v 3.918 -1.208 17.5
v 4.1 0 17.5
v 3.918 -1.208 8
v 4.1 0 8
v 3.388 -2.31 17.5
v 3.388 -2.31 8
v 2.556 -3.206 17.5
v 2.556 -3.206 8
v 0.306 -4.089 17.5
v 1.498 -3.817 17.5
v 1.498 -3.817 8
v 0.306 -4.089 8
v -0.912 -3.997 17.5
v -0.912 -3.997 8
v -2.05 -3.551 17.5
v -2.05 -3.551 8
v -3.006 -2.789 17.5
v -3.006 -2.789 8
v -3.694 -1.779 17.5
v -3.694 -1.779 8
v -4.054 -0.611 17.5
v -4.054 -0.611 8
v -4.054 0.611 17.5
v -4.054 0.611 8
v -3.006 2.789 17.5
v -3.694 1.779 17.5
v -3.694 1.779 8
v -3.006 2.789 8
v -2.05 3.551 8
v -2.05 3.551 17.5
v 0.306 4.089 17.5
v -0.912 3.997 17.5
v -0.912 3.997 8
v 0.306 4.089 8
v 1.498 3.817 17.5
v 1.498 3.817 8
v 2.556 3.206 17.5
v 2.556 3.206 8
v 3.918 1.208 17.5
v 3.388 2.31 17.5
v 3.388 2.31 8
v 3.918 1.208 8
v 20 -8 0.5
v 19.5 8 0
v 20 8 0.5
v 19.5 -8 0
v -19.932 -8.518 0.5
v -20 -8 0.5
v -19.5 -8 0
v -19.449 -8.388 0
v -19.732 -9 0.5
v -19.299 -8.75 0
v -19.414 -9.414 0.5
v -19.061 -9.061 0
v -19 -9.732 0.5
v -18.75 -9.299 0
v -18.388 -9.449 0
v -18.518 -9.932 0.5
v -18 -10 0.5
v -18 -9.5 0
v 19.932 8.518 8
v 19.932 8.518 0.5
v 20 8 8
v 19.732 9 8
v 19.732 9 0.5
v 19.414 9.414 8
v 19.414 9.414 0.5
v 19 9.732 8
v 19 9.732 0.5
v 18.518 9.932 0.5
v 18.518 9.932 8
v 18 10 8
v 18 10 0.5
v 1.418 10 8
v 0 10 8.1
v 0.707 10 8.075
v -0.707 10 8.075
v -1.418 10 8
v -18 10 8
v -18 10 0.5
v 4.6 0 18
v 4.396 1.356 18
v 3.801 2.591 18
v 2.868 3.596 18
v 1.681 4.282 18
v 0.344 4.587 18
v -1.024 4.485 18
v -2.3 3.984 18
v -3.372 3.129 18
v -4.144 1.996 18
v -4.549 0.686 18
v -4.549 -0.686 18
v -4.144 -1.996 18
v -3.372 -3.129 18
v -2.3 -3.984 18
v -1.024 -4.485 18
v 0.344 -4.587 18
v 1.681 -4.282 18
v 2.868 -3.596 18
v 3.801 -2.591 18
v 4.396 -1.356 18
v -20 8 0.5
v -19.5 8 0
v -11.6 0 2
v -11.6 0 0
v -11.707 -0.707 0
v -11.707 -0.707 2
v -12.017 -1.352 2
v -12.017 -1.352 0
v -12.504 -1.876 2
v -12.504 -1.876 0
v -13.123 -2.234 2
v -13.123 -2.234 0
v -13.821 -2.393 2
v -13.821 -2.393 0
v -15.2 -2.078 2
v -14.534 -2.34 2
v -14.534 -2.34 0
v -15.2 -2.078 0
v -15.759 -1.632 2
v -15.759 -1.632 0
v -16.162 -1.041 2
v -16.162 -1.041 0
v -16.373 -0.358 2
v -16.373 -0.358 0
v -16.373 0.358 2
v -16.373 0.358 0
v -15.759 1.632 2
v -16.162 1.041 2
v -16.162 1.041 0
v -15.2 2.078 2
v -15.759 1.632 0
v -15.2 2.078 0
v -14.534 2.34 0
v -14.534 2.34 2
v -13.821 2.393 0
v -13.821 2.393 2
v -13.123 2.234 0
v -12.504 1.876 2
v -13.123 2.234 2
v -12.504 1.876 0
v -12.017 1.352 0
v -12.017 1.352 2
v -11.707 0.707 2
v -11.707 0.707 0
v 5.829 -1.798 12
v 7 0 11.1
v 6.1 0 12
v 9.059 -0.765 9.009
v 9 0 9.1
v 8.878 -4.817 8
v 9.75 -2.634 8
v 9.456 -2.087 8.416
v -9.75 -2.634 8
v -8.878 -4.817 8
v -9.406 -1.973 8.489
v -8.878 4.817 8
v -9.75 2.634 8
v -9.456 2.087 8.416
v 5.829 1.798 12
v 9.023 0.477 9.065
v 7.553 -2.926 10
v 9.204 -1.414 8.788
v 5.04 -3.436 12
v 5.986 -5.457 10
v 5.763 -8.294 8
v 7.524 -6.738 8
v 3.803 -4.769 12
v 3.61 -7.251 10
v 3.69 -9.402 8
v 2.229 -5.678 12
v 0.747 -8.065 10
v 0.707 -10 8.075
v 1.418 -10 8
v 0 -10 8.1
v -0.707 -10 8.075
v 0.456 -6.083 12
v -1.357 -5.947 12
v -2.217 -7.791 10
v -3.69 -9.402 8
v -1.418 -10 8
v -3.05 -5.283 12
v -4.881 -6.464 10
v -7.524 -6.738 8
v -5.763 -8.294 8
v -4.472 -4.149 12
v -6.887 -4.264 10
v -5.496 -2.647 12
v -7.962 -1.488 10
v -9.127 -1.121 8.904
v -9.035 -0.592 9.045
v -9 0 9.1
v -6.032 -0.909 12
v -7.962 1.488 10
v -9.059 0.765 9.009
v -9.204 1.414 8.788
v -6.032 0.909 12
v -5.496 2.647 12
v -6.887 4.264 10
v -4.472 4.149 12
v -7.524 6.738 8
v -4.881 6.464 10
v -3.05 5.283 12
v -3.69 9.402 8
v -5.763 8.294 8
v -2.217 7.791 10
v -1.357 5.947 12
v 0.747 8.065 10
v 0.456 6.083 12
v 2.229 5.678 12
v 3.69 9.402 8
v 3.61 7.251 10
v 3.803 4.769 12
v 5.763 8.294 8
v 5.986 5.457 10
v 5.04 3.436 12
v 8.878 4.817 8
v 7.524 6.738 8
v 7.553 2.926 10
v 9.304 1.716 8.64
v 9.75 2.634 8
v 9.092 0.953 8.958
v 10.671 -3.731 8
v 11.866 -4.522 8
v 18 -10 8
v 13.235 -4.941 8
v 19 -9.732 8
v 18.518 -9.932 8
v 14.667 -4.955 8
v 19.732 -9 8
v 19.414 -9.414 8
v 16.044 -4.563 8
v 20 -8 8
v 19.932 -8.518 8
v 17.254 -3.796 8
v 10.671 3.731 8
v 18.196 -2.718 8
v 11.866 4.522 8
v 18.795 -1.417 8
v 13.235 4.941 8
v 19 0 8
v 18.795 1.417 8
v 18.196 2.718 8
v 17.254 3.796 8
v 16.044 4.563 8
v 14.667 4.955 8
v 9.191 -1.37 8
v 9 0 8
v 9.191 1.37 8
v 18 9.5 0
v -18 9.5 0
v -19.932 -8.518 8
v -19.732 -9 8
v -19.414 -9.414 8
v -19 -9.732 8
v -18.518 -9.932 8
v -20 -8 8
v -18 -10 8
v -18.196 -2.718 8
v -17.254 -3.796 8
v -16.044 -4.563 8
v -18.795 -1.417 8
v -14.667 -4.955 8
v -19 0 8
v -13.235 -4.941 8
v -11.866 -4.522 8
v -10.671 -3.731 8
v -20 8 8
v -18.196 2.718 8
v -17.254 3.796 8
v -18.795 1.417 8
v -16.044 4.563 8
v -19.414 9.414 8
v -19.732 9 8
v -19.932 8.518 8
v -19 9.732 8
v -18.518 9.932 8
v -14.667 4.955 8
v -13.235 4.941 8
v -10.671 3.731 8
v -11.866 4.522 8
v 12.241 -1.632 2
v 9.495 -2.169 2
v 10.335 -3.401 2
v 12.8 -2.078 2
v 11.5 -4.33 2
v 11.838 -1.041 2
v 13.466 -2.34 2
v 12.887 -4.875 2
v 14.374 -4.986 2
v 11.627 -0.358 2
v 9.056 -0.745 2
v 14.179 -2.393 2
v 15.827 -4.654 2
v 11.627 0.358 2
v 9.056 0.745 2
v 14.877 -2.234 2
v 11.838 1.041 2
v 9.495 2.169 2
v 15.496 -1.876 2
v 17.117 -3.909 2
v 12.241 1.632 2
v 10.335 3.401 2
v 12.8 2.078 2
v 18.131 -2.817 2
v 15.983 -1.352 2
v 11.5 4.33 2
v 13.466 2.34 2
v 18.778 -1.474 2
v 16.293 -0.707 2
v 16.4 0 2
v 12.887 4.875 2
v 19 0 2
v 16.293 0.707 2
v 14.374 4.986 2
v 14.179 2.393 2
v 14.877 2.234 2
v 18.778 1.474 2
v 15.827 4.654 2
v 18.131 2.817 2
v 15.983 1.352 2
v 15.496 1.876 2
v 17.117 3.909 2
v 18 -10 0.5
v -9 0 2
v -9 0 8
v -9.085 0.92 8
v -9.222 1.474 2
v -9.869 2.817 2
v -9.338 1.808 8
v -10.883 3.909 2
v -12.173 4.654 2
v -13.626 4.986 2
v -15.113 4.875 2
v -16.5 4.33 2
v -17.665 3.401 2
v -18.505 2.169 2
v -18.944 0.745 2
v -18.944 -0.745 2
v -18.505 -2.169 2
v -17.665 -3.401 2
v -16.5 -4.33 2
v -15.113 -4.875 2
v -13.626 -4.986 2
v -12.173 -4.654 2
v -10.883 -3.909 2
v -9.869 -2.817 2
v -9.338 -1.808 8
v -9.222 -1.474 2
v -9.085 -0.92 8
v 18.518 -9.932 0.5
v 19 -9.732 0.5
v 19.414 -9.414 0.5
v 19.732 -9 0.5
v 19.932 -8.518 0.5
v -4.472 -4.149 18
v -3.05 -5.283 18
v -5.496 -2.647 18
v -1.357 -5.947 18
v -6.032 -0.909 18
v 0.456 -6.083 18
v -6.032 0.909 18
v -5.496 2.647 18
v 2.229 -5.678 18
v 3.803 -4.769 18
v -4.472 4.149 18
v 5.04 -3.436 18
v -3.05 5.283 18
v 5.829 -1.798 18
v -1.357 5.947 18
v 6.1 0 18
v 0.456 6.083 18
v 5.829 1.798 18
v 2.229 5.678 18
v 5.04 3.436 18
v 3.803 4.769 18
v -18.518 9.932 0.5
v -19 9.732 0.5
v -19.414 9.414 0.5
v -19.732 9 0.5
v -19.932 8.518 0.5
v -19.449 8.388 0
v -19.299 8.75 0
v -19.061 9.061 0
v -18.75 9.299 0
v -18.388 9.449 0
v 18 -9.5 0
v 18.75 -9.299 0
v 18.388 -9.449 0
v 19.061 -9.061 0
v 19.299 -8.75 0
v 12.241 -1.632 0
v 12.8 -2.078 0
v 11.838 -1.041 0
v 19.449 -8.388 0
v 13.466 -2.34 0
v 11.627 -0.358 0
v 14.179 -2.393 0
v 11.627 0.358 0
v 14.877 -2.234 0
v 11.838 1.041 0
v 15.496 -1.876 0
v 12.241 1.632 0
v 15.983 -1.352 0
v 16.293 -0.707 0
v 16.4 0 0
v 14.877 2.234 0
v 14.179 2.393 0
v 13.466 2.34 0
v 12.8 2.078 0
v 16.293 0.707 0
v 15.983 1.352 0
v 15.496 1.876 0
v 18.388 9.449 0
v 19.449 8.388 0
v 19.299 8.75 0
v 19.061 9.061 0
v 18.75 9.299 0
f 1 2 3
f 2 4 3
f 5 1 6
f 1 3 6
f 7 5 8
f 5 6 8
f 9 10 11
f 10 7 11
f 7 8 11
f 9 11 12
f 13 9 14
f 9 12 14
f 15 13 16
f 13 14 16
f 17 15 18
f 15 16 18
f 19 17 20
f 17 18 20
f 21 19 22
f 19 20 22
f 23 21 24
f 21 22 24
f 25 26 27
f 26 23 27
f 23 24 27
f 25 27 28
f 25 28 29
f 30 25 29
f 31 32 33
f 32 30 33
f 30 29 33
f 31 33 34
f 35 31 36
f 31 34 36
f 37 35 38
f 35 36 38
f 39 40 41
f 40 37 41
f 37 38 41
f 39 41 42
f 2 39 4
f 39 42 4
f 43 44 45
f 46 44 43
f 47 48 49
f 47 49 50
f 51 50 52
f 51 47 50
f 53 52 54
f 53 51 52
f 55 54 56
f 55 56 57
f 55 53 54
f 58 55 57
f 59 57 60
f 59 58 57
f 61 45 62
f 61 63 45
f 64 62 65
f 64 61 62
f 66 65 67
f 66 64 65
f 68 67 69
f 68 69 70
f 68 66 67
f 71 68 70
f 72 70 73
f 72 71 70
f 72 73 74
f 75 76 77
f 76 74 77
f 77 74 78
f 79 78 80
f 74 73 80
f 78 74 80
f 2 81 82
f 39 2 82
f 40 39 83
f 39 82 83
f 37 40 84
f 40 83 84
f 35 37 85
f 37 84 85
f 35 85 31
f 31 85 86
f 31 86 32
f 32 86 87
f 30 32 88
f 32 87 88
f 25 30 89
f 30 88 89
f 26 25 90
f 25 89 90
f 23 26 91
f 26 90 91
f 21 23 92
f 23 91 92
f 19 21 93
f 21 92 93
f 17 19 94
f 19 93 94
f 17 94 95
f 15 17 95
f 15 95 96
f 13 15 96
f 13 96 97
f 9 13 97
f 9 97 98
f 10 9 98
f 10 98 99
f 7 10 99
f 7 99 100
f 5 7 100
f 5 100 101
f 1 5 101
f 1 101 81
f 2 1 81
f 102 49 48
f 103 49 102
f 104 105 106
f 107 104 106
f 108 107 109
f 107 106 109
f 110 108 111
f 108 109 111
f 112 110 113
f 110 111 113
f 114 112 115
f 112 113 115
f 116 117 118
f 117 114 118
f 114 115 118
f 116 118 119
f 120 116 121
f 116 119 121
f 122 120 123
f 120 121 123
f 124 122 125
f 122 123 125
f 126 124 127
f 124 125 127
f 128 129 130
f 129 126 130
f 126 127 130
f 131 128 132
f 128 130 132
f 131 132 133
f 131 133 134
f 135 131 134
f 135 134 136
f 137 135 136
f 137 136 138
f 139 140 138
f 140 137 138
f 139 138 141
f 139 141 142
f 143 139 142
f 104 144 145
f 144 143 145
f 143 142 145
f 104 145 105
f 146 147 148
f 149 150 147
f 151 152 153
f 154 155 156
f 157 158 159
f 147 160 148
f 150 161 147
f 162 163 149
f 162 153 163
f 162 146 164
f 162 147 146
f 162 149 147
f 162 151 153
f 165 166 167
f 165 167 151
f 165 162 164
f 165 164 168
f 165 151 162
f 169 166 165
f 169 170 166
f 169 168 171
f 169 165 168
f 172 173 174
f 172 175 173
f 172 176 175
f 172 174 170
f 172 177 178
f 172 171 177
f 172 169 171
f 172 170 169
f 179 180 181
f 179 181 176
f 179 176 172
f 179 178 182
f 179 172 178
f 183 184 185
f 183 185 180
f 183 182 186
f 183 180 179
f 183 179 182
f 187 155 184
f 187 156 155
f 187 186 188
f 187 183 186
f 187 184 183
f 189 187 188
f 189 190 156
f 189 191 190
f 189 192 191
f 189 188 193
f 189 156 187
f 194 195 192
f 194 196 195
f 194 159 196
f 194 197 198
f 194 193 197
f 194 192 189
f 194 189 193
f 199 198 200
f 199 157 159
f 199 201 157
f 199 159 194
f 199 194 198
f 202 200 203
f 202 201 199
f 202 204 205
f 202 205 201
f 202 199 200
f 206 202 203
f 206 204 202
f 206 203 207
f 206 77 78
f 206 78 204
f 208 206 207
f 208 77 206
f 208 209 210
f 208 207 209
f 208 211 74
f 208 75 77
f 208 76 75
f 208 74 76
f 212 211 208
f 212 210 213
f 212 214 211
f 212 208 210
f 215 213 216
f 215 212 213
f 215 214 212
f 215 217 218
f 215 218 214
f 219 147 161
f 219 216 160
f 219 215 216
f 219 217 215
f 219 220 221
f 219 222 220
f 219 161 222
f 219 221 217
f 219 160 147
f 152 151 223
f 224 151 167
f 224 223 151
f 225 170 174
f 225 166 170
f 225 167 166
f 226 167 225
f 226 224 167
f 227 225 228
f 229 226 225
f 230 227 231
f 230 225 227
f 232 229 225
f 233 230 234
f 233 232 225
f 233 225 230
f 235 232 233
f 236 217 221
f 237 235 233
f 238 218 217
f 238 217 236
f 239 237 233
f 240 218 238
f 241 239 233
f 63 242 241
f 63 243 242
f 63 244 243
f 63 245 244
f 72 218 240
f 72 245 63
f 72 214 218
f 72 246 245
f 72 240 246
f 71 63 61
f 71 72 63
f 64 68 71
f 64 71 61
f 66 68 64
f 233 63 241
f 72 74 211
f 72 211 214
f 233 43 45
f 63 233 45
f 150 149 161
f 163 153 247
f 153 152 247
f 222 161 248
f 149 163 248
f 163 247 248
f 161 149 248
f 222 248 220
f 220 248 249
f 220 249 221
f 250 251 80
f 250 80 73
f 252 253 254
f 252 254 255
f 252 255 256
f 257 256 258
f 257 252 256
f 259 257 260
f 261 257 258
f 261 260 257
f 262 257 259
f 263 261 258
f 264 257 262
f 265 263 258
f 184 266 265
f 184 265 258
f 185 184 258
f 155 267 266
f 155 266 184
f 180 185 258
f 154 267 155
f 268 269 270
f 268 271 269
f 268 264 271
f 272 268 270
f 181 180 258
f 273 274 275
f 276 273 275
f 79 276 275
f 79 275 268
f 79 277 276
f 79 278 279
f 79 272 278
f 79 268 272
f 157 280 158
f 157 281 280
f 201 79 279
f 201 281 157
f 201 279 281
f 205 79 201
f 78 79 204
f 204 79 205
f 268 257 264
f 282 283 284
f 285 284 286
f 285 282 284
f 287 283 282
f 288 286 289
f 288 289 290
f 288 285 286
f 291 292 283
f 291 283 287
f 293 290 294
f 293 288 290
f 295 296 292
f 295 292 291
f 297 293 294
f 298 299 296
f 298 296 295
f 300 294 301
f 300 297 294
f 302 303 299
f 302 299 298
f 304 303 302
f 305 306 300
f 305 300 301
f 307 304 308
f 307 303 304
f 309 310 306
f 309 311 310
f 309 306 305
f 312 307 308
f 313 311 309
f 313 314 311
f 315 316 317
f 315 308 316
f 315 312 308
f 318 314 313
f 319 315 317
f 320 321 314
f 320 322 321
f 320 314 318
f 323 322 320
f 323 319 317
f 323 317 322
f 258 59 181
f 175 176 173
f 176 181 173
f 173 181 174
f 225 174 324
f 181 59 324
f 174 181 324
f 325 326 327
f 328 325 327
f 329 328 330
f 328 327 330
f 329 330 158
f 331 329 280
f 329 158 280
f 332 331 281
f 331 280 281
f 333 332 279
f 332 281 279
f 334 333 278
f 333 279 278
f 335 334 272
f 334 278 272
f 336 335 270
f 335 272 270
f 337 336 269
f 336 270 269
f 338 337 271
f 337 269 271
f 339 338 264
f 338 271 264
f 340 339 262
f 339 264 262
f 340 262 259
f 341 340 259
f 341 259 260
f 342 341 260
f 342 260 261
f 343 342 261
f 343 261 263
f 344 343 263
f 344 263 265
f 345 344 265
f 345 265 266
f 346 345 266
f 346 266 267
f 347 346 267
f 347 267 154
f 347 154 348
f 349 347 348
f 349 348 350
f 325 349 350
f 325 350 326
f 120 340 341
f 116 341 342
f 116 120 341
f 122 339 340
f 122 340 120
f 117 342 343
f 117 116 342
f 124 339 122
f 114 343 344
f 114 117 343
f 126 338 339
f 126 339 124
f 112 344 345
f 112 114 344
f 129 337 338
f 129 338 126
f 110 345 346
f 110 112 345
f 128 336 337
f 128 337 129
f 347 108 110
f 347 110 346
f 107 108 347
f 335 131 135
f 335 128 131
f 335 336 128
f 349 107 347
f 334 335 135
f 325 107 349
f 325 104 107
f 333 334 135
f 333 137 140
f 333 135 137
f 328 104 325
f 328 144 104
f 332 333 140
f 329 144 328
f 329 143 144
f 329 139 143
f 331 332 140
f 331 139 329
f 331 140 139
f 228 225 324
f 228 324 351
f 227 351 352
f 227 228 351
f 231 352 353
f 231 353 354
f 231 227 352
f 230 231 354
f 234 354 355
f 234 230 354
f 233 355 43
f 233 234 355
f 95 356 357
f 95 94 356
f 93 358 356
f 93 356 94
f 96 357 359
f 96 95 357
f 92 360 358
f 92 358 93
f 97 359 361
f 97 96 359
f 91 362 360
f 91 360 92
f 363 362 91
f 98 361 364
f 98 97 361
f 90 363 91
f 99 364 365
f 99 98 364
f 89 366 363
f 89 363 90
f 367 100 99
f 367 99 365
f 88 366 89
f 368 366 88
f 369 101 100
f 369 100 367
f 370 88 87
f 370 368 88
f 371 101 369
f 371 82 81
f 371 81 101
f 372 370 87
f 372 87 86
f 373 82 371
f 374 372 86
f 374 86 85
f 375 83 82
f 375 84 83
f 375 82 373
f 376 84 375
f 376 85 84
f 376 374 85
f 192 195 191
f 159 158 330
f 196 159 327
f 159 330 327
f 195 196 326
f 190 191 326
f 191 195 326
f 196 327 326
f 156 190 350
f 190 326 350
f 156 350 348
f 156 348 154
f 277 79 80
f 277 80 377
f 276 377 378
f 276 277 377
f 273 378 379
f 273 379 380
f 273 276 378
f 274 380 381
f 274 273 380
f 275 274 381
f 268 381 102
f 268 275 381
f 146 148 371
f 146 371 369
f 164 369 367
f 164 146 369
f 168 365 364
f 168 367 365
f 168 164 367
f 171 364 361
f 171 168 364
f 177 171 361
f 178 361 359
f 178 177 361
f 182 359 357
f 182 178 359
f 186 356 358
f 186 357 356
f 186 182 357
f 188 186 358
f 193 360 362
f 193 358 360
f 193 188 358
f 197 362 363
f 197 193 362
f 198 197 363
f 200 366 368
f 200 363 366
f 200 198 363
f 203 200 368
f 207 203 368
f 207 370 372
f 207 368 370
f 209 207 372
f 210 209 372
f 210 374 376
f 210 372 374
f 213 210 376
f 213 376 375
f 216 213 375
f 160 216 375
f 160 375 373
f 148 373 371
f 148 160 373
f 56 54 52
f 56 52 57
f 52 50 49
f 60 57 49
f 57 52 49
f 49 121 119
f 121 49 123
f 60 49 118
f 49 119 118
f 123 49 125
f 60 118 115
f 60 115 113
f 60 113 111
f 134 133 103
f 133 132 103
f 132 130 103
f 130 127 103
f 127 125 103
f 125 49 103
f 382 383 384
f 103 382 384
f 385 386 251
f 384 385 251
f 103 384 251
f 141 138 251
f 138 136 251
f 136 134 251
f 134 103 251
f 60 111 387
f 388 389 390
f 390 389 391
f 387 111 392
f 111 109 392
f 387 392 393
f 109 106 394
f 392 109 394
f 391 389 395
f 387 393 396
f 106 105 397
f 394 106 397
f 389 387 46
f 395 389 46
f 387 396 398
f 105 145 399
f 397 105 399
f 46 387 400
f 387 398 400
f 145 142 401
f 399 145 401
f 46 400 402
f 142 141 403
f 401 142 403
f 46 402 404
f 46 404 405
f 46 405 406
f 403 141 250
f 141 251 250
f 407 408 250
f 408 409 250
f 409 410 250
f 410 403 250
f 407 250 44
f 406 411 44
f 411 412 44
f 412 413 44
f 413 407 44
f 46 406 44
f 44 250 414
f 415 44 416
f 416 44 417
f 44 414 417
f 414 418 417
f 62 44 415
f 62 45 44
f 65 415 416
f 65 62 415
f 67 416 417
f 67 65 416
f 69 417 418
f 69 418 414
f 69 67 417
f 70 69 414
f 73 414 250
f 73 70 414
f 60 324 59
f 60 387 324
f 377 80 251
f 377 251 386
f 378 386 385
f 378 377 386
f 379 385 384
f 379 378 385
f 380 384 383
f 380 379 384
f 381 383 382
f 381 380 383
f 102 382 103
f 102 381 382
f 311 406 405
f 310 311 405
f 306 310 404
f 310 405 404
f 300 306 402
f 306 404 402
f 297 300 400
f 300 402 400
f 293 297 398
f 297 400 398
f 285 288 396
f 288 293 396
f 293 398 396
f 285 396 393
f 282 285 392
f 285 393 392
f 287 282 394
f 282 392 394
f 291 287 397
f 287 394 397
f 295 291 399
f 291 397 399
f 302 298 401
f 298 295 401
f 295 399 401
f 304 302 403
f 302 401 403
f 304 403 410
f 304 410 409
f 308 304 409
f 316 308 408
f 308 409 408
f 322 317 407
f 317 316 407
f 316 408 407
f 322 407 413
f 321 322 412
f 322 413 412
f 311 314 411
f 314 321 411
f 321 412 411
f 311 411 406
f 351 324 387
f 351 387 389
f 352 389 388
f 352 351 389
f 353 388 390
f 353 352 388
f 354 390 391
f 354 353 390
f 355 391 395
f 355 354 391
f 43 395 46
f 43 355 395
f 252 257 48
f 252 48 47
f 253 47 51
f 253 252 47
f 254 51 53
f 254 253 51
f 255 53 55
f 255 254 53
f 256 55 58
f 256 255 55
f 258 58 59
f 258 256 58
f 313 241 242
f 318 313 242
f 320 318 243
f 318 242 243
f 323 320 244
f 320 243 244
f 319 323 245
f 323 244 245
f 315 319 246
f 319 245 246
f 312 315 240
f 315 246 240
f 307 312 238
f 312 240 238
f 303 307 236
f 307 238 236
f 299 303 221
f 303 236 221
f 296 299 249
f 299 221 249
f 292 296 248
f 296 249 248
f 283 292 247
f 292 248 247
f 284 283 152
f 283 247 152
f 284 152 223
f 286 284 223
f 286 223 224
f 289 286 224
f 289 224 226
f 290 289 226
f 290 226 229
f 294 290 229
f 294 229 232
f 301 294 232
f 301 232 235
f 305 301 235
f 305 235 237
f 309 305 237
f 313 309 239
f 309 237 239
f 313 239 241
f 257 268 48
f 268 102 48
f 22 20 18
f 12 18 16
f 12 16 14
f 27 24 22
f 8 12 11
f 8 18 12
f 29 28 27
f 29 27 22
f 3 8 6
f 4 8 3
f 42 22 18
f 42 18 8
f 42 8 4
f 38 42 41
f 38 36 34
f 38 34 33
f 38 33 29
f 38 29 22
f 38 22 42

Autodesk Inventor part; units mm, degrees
ref_plane "YZ Plane" through (0, 0, 0) normal (1, 0, 0) x (0, 1, 0)
ref_plane "XZ Plane" through (0, 0, 0) normal (0, 1, 0) x (-1, 0, 0)
ref_plane "XY Plane" through (0, 0, 0) normal (0, 0, 1) x (1, 0, 0)
sketch "Sketch1" plane through (0, 0, 0) normal (0, 0, 1) x (1, 0, 0)
  line L0 (-20, -10) -> (20, -10)
  line L1 (20, -10) -> (20, 10)
  line L2 (20, 10) -> (-20, 10)
  line L3 (-20, 10) -> (-20, -10)
  line L4 (-20, -10) -> (20, 10) construction
  line L5 (20, -10) -> (-20, 10) construction
  line L6 (-28, 0) -> (28, 0) projected
  circle A0 centre (-14, 0) radius 2.4
  circle A1 centre (14, 0) radius 2.4
  point P0 (0, 0)
  dimension "d0" = 40
  dimension "d1" = 20
  dimension "d2" = 4.8
  dimension "d3" = 4.8
  dimension "d4" = 6
  dimension "d5" = 6
extrude "Extrusion1" add sketch "Sketch1" along normal blind 8 contours L3 L6 A0 A1 L1 L0 | L3 L2 L1 L6 A1 A0
fillet "Fillet1" radius 2 4 edges at (20, -10, 4) (20, 10, 4) (-20, 10, 4) (-20, -10, 4)
sketch "Sketch2" plane through (0, 0, 8) normal (0, 0, 1) x (1, 0, 0)
  circle A0 centre (0, 0) radius 4.1
  circle A1 centre (0, 0) radius 6.1
  dimension "d9" = 8.2
  dimension "d24" = 2
extrude "Extrusion2" add sketch "Sketch2" along normal blind 10
chamfer "Chamfer1" distance 4 angle 45 1 edges at (-6.1, 0, 8)
chamfer "Chamfer2" distance 0.5 angle 45 1 edges at (-4.1, 0, 18)
sketch "Sketch5" plane through (0, 0, 8) normal (0, 0, 1) x (1, 0, 0)
  circle A0 centre (-14, 0) radius 2.4 projected
  line L0 (-28, 0) -> (28, 0) construction
  line L1 (0, -14) -> (0, 14) projected
  circle A1 centre (-14, 0) radius 5
  circle A2 centre (14, 0) radius 2.4
  circle A3 centre (14, 0) radius 5
  point P0 (0, 0)
  dimension "d28" = 10
extrude "Extrusion4" cut sketch "Sketch5" along normal blind 8
sketch "Sketch6" plane through (0, 0, 8) normal (0, 0, 1) x (1, 0, 0)
  circle A0 centre (14, 0) radius 2.4 projected
  circle A1 centre (-14, 0) radius 2.4 projected
  circle A2 centre (14, 0) radius 5
  circle A3 centre (-14, 0) radius 5
  point P0 (0, 0)
  dimension "d31" = 10
  dimension "d32" = 10
extrude "Extrusion5" cut sketch "Sketch6" against normal blind 6
chamfer "Chamfer3" distance 0.5 angle 45 8 edges at (0, -10, 0) (19.4142, -9.4142, 0) (20, 0, 0) (19.4142, 9.4142, 0) (0, 10, 0) (-19.4142, 9.4142, 0) (-20, 0, 0) (-19.4142, -9.4142, 0)
equation "\"d3\" = d2"
equation "\"d5\" = d4"
equation "\"d32\" = d31"
properties part number "_3DPrint"
